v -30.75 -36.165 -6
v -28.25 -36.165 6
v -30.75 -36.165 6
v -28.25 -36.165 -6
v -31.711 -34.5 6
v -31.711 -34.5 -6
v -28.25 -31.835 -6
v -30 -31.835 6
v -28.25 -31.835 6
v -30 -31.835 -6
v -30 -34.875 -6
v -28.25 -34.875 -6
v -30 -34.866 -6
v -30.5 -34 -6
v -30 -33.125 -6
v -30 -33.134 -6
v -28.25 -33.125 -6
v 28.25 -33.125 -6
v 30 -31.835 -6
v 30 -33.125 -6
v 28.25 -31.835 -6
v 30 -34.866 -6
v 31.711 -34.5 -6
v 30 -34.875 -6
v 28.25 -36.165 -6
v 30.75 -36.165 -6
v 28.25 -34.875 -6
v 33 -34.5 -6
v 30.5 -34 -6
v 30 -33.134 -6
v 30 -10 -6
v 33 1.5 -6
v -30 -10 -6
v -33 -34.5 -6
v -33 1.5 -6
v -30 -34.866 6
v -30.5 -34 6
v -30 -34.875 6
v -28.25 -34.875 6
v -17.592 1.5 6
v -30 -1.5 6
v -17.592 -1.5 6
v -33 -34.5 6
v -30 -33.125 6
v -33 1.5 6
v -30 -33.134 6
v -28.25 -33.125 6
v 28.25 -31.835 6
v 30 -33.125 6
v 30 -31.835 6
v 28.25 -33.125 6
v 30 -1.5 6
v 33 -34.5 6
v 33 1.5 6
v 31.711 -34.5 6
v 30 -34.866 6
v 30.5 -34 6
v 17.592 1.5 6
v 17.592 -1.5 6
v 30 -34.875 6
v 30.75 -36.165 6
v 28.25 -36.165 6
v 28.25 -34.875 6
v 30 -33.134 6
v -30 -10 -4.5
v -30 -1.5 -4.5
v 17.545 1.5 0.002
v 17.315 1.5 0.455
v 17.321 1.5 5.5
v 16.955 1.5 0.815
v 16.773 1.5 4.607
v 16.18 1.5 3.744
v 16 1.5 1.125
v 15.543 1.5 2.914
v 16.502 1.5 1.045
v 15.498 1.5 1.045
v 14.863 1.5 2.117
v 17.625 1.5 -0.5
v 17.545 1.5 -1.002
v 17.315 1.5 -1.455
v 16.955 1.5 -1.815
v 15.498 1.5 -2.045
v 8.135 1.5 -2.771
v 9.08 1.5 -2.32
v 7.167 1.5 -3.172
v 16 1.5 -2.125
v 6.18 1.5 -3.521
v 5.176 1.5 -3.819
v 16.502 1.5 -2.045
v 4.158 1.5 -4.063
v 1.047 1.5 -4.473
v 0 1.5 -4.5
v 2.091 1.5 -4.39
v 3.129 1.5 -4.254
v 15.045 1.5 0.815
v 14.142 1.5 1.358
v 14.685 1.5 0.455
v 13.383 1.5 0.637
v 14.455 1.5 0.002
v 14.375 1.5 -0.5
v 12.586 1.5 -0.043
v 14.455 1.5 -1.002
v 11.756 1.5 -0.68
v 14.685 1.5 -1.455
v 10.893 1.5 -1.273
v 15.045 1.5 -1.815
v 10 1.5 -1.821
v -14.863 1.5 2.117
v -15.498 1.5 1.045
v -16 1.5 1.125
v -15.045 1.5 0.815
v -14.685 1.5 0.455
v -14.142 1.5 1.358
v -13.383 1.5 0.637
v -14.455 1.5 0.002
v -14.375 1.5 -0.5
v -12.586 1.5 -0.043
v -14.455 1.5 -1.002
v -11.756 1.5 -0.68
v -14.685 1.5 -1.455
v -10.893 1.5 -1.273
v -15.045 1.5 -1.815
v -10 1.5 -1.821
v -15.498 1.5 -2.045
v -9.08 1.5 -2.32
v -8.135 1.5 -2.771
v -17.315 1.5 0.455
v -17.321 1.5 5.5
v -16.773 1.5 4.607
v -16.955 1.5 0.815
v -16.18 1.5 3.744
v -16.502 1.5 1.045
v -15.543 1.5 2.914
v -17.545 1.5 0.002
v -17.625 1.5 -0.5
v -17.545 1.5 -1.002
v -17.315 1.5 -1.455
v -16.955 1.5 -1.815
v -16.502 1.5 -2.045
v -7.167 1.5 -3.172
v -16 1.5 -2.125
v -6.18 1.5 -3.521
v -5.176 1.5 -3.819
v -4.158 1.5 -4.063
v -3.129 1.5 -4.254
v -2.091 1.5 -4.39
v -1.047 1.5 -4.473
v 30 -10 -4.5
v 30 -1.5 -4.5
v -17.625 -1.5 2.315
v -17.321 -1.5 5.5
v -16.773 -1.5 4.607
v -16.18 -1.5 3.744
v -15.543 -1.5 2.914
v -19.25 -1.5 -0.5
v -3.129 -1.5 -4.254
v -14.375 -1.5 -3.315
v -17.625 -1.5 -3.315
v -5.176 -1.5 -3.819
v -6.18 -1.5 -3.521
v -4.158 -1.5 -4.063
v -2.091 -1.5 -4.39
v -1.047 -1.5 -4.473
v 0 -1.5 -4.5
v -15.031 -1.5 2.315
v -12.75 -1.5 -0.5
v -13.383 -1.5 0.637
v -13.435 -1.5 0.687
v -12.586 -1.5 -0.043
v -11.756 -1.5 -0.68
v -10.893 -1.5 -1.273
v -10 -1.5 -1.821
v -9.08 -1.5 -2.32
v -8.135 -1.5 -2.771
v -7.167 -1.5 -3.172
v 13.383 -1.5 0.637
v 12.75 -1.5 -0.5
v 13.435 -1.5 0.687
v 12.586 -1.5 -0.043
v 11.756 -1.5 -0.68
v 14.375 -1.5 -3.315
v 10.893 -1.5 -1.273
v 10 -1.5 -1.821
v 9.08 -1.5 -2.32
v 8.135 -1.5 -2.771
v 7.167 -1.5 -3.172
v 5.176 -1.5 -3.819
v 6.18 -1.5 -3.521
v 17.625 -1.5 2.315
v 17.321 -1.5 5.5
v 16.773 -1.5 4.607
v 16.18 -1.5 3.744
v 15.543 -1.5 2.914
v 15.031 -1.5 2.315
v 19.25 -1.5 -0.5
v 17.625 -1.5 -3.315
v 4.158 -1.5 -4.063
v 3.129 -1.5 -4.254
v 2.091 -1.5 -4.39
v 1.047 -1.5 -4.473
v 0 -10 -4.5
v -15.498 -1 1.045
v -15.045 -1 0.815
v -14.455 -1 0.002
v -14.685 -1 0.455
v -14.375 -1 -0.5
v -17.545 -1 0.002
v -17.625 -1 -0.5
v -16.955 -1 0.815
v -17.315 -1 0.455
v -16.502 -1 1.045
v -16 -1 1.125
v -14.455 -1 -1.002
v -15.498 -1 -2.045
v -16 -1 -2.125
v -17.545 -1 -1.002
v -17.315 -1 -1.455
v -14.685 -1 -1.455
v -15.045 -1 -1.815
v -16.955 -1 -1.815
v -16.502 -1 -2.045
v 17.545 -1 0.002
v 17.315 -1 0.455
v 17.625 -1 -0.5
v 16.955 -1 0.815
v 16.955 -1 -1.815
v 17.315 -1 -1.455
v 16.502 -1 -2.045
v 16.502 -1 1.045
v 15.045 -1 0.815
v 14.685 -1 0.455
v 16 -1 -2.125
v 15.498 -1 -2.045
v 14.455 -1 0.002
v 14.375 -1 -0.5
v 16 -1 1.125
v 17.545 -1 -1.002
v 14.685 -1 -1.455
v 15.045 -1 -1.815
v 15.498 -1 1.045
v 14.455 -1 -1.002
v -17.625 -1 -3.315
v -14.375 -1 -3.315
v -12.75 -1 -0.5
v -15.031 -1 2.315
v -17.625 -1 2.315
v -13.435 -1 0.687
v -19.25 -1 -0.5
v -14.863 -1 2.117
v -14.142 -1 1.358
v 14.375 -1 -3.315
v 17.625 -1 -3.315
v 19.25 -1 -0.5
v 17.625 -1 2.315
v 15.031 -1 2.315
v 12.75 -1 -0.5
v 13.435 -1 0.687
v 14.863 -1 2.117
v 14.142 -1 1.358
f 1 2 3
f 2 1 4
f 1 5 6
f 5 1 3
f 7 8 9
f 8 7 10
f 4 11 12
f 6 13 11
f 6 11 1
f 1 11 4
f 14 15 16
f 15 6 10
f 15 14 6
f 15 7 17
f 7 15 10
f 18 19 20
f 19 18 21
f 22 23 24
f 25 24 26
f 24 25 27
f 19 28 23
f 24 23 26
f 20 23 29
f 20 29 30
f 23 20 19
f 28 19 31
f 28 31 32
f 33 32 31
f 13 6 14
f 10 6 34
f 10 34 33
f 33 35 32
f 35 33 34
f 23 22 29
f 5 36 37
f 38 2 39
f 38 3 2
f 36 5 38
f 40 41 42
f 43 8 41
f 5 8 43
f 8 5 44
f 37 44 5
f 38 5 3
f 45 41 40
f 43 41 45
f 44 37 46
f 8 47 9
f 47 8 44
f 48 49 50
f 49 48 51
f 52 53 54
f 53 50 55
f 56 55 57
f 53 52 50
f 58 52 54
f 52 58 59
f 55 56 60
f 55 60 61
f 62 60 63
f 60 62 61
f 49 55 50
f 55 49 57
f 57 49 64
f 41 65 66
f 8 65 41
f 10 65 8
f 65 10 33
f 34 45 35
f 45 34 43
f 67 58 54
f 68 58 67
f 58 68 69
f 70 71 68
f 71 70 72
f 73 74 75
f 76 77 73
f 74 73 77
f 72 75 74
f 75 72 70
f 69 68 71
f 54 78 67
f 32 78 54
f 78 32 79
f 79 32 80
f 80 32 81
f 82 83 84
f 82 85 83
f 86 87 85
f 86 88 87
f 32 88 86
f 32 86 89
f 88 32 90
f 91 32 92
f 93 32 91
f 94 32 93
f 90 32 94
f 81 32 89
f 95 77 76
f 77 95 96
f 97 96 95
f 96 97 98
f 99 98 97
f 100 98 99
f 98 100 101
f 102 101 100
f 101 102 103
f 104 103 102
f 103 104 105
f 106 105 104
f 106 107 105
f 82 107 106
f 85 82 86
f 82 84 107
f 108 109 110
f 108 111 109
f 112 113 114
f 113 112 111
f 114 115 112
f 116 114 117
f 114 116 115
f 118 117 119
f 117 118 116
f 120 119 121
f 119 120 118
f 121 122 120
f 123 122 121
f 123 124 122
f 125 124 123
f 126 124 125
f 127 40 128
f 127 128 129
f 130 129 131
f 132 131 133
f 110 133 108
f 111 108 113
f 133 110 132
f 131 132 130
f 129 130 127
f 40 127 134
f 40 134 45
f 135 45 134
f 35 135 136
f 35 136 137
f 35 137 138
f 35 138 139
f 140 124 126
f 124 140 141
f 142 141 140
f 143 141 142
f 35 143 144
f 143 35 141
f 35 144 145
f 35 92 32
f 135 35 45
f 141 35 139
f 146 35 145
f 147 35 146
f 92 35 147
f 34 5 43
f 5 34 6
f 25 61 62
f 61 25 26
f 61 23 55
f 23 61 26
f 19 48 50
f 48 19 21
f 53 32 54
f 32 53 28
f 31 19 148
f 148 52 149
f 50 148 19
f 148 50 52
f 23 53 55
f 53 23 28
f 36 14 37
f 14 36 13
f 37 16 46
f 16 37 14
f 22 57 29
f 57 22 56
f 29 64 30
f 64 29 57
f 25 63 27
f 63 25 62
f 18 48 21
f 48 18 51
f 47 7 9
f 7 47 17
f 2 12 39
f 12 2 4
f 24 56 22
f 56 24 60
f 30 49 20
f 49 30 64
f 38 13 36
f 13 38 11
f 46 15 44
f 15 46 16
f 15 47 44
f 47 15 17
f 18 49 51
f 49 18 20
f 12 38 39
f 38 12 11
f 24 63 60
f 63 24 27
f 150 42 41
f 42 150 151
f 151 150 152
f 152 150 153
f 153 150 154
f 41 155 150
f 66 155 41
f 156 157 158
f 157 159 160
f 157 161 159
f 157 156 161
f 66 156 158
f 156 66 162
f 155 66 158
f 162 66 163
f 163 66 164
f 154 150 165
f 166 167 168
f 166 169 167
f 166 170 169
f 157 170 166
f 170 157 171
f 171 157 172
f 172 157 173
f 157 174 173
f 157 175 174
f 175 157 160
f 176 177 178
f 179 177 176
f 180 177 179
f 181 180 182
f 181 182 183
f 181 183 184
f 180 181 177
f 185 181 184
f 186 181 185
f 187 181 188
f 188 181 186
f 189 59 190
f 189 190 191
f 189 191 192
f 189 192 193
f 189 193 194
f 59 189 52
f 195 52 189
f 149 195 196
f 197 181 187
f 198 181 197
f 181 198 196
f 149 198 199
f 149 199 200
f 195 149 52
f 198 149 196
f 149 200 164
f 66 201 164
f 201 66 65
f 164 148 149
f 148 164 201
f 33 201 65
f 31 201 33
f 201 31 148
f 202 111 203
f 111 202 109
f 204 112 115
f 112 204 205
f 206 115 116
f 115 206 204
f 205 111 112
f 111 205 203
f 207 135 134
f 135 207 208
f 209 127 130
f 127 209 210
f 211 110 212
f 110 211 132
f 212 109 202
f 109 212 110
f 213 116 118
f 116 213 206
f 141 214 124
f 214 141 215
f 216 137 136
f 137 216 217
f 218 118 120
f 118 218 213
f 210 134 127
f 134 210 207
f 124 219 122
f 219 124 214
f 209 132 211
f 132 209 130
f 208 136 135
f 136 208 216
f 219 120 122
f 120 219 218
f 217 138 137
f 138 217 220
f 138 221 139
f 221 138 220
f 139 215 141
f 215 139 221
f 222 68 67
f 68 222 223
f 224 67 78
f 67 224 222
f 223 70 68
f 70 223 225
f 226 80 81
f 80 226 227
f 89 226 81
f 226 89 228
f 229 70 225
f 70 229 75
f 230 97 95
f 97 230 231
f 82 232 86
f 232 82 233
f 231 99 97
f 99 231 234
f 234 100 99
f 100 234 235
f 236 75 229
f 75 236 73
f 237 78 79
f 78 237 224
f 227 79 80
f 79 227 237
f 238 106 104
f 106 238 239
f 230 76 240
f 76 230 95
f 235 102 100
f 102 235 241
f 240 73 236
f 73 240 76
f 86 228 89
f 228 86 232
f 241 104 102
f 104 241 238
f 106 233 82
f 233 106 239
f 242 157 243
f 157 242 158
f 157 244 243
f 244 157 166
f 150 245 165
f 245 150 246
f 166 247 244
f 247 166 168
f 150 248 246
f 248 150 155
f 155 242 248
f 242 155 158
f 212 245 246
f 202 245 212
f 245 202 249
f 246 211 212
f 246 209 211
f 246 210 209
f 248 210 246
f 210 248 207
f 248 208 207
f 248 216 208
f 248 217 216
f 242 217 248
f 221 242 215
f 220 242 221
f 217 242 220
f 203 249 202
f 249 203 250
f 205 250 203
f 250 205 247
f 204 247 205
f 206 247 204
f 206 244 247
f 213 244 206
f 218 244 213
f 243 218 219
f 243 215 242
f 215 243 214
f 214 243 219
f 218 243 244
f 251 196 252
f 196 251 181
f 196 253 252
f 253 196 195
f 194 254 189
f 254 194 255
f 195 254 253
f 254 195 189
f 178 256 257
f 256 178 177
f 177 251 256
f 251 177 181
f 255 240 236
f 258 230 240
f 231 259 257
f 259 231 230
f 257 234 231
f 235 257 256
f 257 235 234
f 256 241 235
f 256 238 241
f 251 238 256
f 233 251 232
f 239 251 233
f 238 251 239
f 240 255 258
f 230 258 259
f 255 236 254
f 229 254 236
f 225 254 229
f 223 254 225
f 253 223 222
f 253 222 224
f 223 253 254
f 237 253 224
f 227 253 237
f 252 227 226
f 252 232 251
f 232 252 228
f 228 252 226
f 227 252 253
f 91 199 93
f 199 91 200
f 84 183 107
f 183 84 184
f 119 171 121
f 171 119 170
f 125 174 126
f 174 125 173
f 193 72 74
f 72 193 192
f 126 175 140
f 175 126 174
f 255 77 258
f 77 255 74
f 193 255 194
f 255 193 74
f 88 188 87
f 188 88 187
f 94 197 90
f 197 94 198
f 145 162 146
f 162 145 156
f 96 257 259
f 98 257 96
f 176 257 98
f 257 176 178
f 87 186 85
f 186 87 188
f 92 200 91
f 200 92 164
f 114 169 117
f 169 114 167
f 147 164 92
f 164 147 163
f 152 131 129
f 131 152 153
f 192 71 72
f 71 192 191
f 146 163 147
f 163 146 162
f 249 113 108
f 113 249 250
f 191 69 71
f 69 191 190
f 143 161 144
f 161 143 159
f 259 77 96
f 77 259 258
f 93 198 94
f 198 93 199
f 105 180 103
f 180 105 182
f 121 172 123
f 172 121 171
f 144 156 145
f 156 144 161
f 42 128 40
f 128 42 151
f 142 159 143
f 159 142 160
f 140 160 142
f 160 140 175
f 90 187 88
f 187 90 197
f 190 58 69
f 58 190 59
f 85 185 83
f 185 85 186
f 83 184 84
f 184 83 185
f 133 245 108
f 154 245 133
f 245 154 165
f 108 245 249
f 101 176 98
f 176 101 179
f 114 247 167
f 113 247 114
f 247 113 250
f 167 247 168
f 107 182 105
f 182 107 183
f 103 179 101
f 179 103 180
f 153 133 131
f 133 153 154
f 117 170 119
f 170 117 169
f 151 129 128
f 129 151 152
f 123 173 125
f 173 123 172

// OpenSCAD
// MOAB - MOther of All fan Brackets
// Design by Marius Gheorghescu, October 2013.
// Update log
// November 5th 2013: 
//  - fan cutout (and the screw holes) can be removed entirely now to produce spacers or PCB feet 
//  - hex nuts resize with screw size (need to vealidate in practice)
//  - cross-brace is configurable and can also be removed


// Typical values 40, 50, 60, 80. Set to 0 to not have a fan cutout.
fan_size = 40;

// Distance between two fan holes. Typical values: 32.00 for 40mm fan, 40.00 for 50mm fan, 50.00 for 60mm fan, 71.50 for 80mm fan, 105.00 for 120mm fan. Set to value larger than fan size to not have any screw holes
fan_hole_spacing = 32;

// Use 3.25mm for M3, 4.25mm for M4 and so on
screw_diameter = 3.25;

// width of the PCB. Common values: 60mm for RAMPS, 53.5mm for Arduino, 56mm for Raspberry Pi
pcb_width = 60.0;

// distance from bottom of the fan to PCB. Recommended value for RAMPS fuse clearance: 35mm
bracket_height = 36;

// how long the bracket needs to be, typically 10mm for mini brackets, or close to fan size for full brackets
bracket_length = 12;

// typically 2-4mm
bracket_thickness = 3.0;

// how tall is the cross brace that addds additional strength to the bracket, set to 0 to not have one
cross_bracket = 10;

/* [Hidden] */

// how much to go over the PCB
lip_size = 1.75;

// effective width of the bracket at the top
bracket_width = max(pcb_width, fan_size - 4);

module legs()
{

    difference() {
        union() {

            // left clip
            color([0,0,.5])
            translate([-pcb_width/2 + .5, -bracket_height + 2, 0])
                rotate([0, 0, 180]) 
                    cylinder(r=2.5, h=bracket_length, $fn=6, center=true);

            // left leg
            color([0,0,1])
            translate([-pcb_width/2 - bracket_thickness, -bracket_height + bracket_thickness/2, -bracket_length/2])
                cube([bracket_thickness, bracket_height, bracket_length]);


            // right clip
            color([0,0,.5])
            translate([pcb_width/2 - .5, -bracket_height + 2, 0])
                 rotate([0, 0, 180]) 
                     cylinder(r=2.5, h=bracket_length, $fn=6, center=true);

            // right leg
            color([0,0,1])
           translate([pcb_width/2 , -bracket_height + bracket_thickness/2, -bracket_length/2])
                cube([bracket_thickness, bracket_height, bracket_length]);

        }

        // left cutout
       translate([-pcb_width/2 + .5, -bracket_height + 2, 0])
            rotate([0, 0, 180]) 
                cylinder(r=1, h=bracket_length + 0.1, $fn=6, center=true);

        // right cutout
       translate([pcb_width/2 - .5, -bracket_height + 2, 0])
            cylinder(r=1, h=bracket_length + 0.1, $fn=6, center=true);

        // PCB lips clearance
        translate([0, -bracket_height + bracket_thickness + -.5,0])
            cube([pcb_width - 2*lip_size, 12, bracket_length + 0.1], center=true);

        // PCB
        translate([0, -bracket_height + 2, 0])
            cube([pcb_width, 1.75, bracket_length + 0.1], center=true);

    }

}

module fan_mask()
{
    // M3 screw
    translate([-fan_hole_spacing/2, -fan_hole_spacing/2, 0])
        cylinder(r=screw_diameter/2, h=bracket_height, $fn=20, center=true);
    translate([fan_hole_spacing/2, -fan_hole_spacing/2, 0])
        cylinder(r=screw_diameter/2, h=bracket_height, $fn=20, center=true);
    translate([-fan_hole_spacing/2, fan_hole_spacing/2, 0])
        cylinder(r=screw_diameter/2, h=bracket_height, $fn=20, center=true);
    translate([fan_hole_spacing/2, fan_hole_spacing/2, 0])
        cylinder(r=screw_diameter/2, h=bracket_height, $fn=20, center=true);

    // M3 nuts
    translate([-fan_hole_spacing/2, -fan_hole_spacing/2, 0])
        cylinder(r=screw_diameter, h=4, $fn=6, center=true);
    translate([fan_hole_spacing/2, -fan_hole_spacing/2, 0])
        cylinder(r=screw_diameter, h=4, $fn=6, center=true);
    translate([-fan_hole_spacing/2, fan_hole_spacing/2, 0])
        cylinder(r=screw_diameter, h=4, $fn=6, center=true);
    translate([fan_hole_spacing/2, fan_hole_spacing/2, 0])
        cylinder(r=screw_diameter, h=4, $fn=6, center=true);

    // fan blade clearance
    difference() {
        cylinder(r=fan_size/2, h=bracket_height, $fn=120, center=true);

        // $TODO - add support around the screws if they are too close to the blades
        // also need to add support if the bracket is not wide (tall) enough 
    }
}


module bracket()
{
    difference() {
        union() {

            // fan base
            translate([0, 0, 0])
                cube([bracket_width + 2*bracket_thickness, bracket_thickness, bracket_length], center=true);

            // extra strength 
            color([1,.5,0])
            translate([0, -cross_bracket/2, -bracket_length/2 + bracket_thickness/4])
                cube([pcb_width + 1, cross_bracket, bracket_thickness/2], center=true);

            legs();
        }


        translate([0, -bracket_thickness, -bracket_length/2 + fan_size/2 + bracket_thickness/2])
        rotate([90,0,0])
            fan_mask();

        }
}


module assembly() 
{
    color([1,0,0])
    translate([0, 0, -fan_size/2])
        bracket();

    color([1,0,0])
    //translate([0, 0, fan_size/2])
    rotate([0,180,0])
        bracket();

    color([0,.5,0])
    translate([0, -bracket_height + 2, 0])
        cube([pcb_width - 1, 1.75, fan_size*1.5], center=true);

}

//assembly();
bracket();
//fan_mask();
